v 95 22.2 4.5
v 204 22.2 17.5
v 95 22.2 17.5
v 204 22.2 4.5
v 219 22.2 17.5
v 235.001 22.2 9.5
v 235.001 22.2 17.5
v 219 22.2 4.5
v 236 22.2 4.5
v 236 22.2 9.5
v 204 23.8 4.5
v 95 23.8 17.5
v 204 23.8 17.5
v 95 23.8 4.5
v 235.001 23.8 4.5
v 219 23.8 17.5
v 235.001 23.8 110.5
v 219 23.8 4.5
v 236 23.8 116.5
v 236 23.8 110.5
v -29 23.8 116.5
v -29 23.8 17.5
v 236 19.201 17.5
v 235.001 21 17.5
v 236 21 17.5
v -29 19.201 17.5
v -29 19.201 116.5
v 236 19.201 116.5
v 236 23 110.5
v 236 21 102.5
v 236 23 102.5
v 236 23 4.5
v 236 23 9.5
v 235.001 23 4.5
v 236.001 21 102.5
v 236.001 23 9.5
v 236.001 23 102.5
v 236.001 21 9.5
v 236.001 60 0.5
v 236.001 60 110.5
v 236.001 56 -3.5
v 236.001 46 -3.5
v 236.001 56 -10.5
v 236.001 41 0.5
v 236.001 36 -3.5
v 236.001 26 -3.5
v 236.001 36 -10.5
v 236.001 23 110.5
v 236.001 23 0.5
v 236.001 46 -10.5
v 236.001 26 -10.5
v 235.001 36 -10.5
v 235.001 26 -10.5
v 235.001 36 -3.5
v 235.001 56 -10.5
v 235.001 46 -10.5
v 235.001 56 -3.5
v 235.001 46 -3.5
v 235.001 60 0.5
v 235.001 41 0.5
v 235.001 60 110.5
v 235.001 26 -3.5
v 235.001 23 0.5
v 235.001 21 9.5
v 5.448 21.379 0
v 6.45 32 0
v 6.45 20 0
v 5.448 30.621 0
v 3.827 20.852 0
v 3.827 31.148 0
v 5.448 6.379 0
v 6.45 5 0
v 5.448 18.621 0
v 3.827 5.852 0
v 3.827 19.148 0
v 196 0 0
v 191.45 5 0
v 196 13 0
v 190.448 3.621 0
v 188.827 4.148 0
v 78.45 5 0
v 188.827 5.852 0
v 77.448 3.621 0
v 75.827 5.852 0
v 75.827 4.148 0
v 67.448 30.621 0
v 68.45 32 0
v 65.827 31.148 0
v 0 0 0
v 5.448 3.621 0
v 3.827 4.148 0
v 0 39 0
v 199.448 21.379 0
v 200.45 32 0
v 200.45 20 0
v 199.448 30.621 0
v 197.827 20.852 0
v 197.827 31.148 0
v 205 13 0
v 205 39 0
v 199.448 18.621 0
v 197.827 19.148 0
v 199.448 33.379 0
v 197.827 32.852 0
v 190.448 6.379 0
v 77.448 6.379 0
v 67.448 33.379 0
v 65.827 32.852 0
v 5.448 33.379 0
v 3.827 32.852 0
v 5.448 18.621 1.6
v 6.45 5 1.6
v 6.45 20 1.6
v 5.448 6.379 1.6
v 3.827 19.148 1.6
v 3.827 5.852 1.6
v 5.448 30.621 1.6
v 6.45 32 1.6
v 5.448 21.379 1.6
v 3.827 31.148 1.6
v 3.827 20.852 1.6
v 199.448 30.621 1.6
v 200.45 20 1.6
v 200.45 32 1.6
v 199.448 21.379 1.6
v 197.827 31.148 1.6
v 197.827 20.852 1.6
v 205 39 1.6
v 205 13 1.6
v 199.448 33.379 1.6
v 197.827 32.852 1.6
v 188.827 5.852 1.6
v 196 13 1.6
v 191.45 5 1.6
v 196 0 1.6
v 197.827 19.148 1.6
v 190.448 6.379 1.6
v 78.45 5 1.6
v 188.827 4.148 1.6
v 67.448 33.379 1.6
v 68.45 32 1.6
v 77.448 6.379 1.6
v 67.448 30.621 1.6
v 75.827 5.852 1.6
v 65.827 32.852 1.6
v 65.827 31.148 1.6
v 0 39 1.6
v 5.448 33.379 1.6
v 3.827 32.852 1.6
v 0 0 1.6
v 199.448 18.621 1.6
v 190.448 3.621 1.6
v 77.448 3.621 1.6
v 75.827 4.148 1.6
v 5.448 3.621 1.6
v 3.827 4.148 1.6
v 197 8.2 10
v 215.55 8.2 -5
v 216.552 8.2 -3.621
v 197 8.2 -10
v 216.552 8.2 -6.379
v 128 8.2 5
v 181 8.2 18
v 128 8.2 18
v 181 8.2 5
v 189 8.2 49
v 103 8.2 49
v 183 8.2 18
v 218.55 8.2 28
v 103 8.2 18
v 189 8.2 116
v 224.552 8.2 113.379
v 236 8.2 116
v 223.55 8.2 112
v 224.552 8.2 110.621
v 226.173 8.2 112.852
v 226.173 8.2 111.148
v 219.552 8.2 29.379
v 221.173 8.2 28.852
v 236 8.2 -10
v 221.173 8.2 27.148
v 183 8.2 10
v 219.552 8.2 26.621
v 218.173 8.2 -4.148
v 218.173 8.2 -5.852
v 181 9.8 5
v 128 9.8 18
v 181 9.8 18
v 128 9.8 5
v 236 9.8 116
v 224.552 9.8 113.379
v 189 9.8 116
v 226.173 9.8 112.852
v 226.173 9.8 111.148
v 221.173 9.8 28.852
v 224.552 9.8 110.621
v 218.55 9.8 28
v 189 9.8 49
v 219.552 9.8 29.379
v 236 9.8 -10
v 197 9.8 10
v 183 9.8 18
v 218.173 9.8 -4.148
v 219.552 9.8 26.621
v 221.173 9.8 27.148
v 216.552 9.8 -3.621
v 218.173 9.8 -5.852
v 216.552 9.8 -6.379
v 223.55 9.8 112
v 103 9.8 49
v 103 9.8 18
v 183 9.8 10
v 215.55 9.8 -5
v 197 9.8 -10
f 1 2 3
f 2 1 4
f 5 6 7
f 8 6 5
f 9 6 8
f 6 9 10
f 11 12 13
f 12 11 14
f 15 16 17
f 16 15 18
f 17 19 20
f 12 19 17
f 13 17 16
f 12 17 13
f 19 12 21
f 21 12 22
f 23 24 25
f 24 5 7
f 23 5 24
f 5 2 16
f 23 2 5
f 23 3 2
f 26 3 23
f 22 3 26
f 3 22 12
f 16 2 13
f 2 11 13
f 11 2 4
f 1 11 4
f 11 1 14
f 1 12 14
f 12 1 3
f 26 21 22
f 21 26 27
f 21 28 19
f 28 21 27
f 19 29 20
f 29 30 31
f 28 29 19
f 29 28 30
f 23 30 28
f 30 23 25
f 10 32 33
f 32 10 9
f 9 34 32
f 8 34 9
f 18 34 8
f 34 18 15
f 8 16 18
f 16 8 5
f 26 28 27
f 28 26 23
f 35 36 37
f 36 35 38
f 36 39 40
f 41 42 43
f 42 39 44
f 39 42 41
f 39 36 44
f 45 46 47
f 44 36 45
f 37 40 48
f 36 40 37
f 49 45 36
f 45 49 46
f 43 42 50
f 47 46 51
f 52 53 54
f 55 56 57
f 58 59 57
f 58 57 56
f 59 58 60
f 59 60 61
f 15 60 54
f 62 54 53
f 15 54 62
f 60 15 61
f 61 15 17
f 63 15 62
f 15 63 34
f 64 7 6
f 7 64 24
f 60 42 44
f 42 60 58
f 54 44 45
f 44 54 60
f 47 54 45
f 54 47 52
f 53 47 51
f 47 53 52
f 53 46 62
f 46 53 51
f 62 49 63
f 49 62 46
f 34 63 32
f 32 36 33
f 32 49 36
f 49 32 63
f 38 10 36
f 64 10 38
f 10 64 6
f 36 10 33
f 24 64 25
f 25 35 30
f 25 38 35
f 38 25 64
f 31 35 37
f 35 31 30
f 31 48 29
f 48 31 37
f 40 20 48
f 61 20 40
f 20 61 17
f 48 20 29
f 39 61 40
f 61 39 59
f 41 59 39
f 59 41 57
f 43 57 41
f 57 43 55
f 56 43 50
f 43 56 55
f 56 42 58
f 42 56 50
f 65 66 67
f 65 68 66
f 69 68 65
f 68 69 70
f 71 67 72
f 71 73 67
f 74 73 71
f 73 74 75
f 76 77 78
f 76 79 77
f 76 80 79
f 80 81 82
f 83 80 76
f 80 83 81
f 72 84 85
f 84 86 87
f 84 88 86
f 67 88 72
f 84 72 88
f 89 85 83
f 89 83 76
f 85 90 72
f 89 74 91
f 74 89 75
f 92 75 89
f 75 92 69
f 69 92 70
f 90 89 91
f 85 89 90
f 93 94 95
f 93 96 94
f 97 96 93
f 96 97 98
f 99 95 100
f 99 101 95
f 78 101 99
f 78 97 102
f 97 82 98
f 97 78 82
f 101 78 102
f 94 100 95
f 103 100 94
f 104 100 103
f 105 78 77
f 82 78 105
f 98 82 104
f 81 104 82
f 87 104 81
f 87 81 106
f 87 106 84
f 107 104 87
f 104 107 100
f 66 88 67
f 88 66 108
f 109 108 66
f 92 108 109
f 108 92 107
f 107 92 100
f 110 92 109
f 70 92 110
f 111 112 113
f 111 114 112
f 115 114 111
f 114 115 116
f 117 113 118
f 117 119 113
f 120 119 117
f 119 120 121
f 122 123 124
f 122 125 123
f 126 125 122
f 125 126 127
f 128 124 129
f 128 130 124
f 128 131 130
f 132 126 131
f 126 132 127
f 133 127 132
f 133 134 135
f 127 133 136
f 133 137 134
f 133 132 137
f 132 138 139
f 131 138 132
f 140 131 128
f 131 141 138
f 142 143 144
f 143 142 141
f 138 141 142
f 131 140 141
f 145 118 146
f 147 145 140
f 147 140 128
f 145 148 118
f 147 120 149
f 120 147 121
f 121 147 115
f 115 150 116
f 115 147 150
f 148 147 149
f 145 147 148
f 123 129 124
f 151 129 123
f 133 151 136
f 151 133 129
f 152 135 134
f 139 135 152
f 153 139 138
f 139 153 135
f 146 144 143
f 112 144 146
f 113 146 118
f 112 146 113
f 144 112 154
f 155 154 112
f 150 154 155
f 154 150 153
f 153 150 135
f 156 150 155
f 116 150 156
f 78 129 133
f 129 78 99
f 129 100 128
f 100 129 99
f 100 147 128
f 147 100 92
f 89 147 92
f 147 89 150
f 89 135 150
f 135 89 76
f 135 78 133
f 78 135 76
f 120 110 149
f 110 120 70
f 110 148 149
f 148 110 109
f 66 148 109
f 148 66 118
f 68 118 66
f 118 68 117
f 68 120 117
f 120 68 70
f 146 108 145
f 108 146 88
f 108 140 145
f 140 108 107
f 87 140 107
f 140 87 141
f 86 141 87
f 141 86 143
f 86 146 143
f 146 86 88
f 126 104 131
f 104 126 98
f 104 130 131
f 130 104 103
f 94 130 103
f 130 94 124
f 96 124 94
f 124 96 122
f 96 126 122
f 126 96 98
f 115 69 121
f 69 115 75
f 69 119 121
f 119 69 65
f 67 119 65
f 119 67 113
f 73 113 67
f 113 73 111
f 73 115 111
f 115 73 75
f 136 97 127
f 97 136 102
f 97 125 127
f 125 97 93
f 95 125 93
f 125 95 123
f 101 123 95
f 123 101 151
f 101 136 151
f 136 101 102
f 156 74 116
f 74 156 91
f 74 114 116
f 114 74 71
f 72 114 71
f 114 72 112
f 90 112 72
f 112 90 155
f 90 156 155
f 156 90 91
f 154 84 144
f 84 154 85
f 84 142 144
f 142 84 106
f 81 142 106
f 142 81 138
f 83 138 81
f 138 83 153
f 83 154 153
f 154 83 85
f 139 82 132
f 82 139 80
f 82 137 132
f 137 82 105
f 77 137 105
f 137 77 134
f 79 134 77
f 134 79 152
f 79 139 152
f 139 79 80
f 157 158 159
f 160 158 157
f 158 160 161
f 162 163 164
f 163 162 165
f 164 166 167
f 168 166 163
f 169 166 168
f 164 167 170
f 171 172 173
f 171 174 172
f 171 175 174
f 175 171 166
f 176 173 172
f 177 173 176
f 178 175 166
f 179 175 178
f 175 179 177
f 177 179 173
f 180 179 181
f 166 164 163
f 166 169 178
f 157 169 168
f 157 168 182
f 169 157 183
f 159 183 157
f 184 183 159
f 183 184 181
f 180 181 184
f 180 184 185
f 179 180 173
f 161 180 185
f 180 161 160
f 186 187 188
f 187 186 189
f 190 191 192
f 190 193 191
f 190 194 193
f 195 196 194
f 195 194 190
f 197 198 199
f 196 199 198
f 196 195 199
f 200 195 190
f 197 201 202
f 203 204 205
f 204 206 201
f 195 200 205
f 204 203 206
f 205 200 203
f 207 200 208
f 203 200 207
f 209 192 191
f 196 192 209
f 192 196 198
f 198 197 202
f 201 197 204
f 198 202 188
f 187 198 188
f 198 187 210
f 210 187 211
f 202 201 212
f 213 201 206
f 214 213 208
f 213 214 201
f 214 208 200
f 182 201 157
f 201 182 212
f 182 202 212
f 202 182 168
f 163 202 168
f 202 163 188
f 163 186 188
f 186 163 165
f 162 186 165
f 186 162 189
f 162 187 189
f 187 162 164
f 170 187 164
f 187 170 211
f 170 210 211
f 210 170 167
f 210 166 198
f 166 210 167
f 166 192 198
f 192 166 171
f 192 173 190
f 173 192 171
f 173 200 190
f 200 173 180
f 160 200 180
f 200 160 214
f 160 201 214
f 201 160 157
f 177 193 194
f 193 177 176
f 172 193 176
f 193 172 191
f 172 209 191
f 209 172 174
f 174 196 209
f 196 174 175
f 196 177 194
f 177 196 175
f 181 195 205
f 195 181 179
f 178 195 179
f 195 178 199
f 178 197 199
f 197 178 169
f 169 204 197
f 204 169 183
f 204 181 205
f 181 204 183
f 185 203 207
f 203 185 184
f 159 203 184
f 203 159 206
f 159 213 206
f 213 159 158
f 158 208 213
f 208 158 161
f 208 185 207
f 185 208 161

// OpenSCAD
eps = 0.001;

// element visiblity
ENABLE_BP = true;
ENABLE_IO = true;
ENABLE_GPU = true;

// colors
BP_COLOR = "DarkGreen";
BP_OPACITY = 0.3;
IO_COLOR = "DarkGreen";
IO_OPACITY = 0.3;
GPU_COLOR = "Black";
GPU_OPACITY = 0.3;

/****************************************************
 * Backplane
 ****************************************************/
 
// dimensions
BP_x0 = 196;
BP_x1 = 205;
BP_y0 = 13;
BP_y1 = 39;
BP_HOLE_DIAMETER = 2.9;
BP_THICKNESS = 1.6;

// holes
HOLE_A = [5, 32];
HOLE_B = [5, 20];
HOLE_C = [5, 5];
HOLE_D = [67, 32];
HOLE_E = [77, 5];
HOLE_F = [199, 32];
HOLE_G = [199, 20];
HOLE_H = [190, 5];

// points
p0 = [0, 0];
p1 = [0, BP_y1];
p6 = [BP_x1, BP_y1];
p7 = [BP_x1, BP_y0];
p8 = [BP_x0, BP_y0];
p9 = [BP_x0, 0];

module bp_hole(center) {
    translate(center) circle(d=BP_HOLE_DIAMETER);
}

if(ENABLE_BP)
color(BP_COLOR, BP_OPACITY)
linear_extrude(BP_THICKNESS)
difference() {
    polygon([p0, p1, p6, p7, p8, p9]);
    bp_hole(HOLE_A);
    bp_hole(HOLE_B);
    bp_hole(HOLE_C);
    bp_hole(HOLE_D);
    bp_hole(HOLE_E);
    bp_hole(HOLE_F);
    bp_hole(HOLE_G);
    bp_hole(HOLE_H);    
}

/****************************************************
 * I/O Board
 ****************************************************/

// dimensions
IO_ORIGIN = [236, 9, -10];
IO_ROTATION = [90, 0, 180];
IO_x0 = 39;
IO_x1 = 47;
IO_x2 = 53;
IO_x3 = 55;
IO_x4 = 108;
IO_x5 = 133;
IO_y0 = 15;
IO_y1 = 20;
IO_y2 = 28;
IO_y3 = 59;
IO_y4 = 126;
IO_HOLE_DIAMETER = 2.9;
IO_THICKNESS = 1.6;

// holes
HOLE_I = [19, 5];
HOLE_J = [16, 38];
HOLE_K = [11, 122];

// points
p10 = [0, 0];
p11 = [0, IO_y4];
p12 = [IO_x1, IO_y4];
p13 = [IO_x1, IO_y3];
p14 = [IO_x5, IO_y3];
p15 = [IO_x5, IO_y2];
p16 = [IO_x4, IO_y2];
p17 = [IO_x4, IO_y0];
p18 = [IO_x3, IO_y0];
p19 = [IO_x3, IO_y2];
p20 = [IO_x2, IO_y2];
p21 = [IO_x2, IO_y1];
p22 = [IO_x0, IO_y1];
p23 = [IO_x0, 0];

module io_hole(center) {
    translate(center) circle(d=IO_HOLE_DIAMETER);
}

if(ENABLE_IO)
    color(IO_COLOR, IO_OPACITY)
    translate(IO_ORIGIN)
    rotate(IO_ROTATION)
    linear_extrude(IO_THICKNESS, center=true)
    difference() {
        polygon([
            p10, p11, p12, p13,
            p14, p15, p16, p17,
            p18, p19, p20, p21,
            p22, p23]);
        io_hole(HOLE_I);
        io_hole(HOLE_J);
        io_hole(HOLE_K);
    }

/****************************************************
 * GPU
 ****************************************************/

// dimensions
GPU_ORIGIN = [236, 23, 4.5];
GPU_ROTATION = [90, 0, 180];
GPU_x0 = 17;
GPU_x1 = 32;
GPU_x2 = 141;
GPU_x3 = 265;
GPU_y0 = 13;
GPU_y1 = 112;
GPU_BOARD_THICKNESS = 1.6;
GPU_BACKPLATE_THICKNESS = 3;
GPU_BACKPLATE_OFFSET = GPU_BOARD_THICKNESS/2 + GPU_BACKPLATE_THICKNESS - eps;
GPU_BRACKET_THICKNESS = 1;
GPU_BRACKET_ROTATION = [0, 90, 0];
GPU_BRACKET_TRANSLATION = [-eps, -15, 37];

GPU_BKT_x0 = 4;
GPU_BKT_x1 = 14;
GPU_BKT_x2 = 19;
GPU_BKT_x3 = 24;
GPU_BKT_x4 = 34;
GPU_BKT_x5 = 37;
GPU_BKT_x6 = 39;
GPU_BKT_y0 = 7;
GPU_BKT_y1 = 11;
GPU_BKT_y2 = 20;
GPU_BKT_y3 = 113;
GPU_BKT_y4 = 121;

// points
p24 = [0, 0];
p25 = [0, GPU_y1];
p26 = [GPU_x3, GPU_y1];
p27 = [GPU_x3, GPU_y0];
p28 = [GPU_x2, GPU_y0];
p29 = [GPU_x2, 0];
p30 = [GPU_x1, 0];
p31 = [GPU_x1, GPU_y0];
p32 = [GPU_x0, GPU_y0];
p33 = [GPU_x0, 0];
p34 = [0, GPU_y0];

p35 = [0, GPU_BKT_y1];
p36 = [0, GPU_BKT_y4];
//p37 = [GPU_BKT_x, GPU_BKT_y];
//p38 = [GPU_BKT_x, GPU_BKT_y];
p39 = [GPU_BKT_x5, GPU_BKT_y4];
p39a = [GPU_BKT_x5, GPU_BKT_y3];
p39b = [GPU_BKT_x6, GPU_BKT_y3];
p40 = [GPU_BKT_x6, GPU_BKT_y2];
p41 = [GPU_BKT_x5, GPU_BKT_y2];
p42 = [GPU_BKT_x5, GPU_BKT_y1];
p43 = [GPU_BKT_x4, GPU_BKT_y0];
p44 = [GPU_BKT_x4, 0];
p45 = [GPU_BKT_x3, 0];
p46 = [GPU_BKT_x3, GPU_BKT_y0];
p47 = [GPU_BKT_x2, GPU_BKT_y1];
p48 = [GPU_BKT_x1, GPU_BKT_y0];
p49 = [GPU_BKT_x1, 0];
p50 = [GPU_BKT_x0, 0];
p51 = [GPU_BKT_x0, GPU_BKT_y0];

module gpu_card() {
    linear_extrude(GPU_BOARD_THICKNESS, center=true)
    polygon([
        p24, p25, p26, p27,
        p28, p29, p30, p31,
        p32, p33]);
}

module gpu_backplate() {
    linear_extrude(GPU_BACKPLATE_THICKNESS)
    polygon([
        p34, p25, p26, p27]);
}

module gpu_bracket() {
    translate(GPU_BRACKET_TRANSLATION)
    rotate(GPU_BRACKET_ROTATION)
    linear_extrude(GPU_BRACKET_THICKNESS)
    polygon([
        p35, p36, p39, p39a,
        p39b, p40, p41, p42,
        p43, p44, p45, p46,
        p47, p48, p49, p50,
        p51
    ]);
}
    
if(ENABLE_GPU)
    color(GPU_COLOR, GPU_OPACITY)
    translate(GPU_ORIGIN)
    rotate(GPU_ROTATION)
    union() {
        gpu_card();
        translate([0, 0, -GPU_BACKPLATE_OFFSET]) gpu_backplate();
        gpu_bracket();
    }
